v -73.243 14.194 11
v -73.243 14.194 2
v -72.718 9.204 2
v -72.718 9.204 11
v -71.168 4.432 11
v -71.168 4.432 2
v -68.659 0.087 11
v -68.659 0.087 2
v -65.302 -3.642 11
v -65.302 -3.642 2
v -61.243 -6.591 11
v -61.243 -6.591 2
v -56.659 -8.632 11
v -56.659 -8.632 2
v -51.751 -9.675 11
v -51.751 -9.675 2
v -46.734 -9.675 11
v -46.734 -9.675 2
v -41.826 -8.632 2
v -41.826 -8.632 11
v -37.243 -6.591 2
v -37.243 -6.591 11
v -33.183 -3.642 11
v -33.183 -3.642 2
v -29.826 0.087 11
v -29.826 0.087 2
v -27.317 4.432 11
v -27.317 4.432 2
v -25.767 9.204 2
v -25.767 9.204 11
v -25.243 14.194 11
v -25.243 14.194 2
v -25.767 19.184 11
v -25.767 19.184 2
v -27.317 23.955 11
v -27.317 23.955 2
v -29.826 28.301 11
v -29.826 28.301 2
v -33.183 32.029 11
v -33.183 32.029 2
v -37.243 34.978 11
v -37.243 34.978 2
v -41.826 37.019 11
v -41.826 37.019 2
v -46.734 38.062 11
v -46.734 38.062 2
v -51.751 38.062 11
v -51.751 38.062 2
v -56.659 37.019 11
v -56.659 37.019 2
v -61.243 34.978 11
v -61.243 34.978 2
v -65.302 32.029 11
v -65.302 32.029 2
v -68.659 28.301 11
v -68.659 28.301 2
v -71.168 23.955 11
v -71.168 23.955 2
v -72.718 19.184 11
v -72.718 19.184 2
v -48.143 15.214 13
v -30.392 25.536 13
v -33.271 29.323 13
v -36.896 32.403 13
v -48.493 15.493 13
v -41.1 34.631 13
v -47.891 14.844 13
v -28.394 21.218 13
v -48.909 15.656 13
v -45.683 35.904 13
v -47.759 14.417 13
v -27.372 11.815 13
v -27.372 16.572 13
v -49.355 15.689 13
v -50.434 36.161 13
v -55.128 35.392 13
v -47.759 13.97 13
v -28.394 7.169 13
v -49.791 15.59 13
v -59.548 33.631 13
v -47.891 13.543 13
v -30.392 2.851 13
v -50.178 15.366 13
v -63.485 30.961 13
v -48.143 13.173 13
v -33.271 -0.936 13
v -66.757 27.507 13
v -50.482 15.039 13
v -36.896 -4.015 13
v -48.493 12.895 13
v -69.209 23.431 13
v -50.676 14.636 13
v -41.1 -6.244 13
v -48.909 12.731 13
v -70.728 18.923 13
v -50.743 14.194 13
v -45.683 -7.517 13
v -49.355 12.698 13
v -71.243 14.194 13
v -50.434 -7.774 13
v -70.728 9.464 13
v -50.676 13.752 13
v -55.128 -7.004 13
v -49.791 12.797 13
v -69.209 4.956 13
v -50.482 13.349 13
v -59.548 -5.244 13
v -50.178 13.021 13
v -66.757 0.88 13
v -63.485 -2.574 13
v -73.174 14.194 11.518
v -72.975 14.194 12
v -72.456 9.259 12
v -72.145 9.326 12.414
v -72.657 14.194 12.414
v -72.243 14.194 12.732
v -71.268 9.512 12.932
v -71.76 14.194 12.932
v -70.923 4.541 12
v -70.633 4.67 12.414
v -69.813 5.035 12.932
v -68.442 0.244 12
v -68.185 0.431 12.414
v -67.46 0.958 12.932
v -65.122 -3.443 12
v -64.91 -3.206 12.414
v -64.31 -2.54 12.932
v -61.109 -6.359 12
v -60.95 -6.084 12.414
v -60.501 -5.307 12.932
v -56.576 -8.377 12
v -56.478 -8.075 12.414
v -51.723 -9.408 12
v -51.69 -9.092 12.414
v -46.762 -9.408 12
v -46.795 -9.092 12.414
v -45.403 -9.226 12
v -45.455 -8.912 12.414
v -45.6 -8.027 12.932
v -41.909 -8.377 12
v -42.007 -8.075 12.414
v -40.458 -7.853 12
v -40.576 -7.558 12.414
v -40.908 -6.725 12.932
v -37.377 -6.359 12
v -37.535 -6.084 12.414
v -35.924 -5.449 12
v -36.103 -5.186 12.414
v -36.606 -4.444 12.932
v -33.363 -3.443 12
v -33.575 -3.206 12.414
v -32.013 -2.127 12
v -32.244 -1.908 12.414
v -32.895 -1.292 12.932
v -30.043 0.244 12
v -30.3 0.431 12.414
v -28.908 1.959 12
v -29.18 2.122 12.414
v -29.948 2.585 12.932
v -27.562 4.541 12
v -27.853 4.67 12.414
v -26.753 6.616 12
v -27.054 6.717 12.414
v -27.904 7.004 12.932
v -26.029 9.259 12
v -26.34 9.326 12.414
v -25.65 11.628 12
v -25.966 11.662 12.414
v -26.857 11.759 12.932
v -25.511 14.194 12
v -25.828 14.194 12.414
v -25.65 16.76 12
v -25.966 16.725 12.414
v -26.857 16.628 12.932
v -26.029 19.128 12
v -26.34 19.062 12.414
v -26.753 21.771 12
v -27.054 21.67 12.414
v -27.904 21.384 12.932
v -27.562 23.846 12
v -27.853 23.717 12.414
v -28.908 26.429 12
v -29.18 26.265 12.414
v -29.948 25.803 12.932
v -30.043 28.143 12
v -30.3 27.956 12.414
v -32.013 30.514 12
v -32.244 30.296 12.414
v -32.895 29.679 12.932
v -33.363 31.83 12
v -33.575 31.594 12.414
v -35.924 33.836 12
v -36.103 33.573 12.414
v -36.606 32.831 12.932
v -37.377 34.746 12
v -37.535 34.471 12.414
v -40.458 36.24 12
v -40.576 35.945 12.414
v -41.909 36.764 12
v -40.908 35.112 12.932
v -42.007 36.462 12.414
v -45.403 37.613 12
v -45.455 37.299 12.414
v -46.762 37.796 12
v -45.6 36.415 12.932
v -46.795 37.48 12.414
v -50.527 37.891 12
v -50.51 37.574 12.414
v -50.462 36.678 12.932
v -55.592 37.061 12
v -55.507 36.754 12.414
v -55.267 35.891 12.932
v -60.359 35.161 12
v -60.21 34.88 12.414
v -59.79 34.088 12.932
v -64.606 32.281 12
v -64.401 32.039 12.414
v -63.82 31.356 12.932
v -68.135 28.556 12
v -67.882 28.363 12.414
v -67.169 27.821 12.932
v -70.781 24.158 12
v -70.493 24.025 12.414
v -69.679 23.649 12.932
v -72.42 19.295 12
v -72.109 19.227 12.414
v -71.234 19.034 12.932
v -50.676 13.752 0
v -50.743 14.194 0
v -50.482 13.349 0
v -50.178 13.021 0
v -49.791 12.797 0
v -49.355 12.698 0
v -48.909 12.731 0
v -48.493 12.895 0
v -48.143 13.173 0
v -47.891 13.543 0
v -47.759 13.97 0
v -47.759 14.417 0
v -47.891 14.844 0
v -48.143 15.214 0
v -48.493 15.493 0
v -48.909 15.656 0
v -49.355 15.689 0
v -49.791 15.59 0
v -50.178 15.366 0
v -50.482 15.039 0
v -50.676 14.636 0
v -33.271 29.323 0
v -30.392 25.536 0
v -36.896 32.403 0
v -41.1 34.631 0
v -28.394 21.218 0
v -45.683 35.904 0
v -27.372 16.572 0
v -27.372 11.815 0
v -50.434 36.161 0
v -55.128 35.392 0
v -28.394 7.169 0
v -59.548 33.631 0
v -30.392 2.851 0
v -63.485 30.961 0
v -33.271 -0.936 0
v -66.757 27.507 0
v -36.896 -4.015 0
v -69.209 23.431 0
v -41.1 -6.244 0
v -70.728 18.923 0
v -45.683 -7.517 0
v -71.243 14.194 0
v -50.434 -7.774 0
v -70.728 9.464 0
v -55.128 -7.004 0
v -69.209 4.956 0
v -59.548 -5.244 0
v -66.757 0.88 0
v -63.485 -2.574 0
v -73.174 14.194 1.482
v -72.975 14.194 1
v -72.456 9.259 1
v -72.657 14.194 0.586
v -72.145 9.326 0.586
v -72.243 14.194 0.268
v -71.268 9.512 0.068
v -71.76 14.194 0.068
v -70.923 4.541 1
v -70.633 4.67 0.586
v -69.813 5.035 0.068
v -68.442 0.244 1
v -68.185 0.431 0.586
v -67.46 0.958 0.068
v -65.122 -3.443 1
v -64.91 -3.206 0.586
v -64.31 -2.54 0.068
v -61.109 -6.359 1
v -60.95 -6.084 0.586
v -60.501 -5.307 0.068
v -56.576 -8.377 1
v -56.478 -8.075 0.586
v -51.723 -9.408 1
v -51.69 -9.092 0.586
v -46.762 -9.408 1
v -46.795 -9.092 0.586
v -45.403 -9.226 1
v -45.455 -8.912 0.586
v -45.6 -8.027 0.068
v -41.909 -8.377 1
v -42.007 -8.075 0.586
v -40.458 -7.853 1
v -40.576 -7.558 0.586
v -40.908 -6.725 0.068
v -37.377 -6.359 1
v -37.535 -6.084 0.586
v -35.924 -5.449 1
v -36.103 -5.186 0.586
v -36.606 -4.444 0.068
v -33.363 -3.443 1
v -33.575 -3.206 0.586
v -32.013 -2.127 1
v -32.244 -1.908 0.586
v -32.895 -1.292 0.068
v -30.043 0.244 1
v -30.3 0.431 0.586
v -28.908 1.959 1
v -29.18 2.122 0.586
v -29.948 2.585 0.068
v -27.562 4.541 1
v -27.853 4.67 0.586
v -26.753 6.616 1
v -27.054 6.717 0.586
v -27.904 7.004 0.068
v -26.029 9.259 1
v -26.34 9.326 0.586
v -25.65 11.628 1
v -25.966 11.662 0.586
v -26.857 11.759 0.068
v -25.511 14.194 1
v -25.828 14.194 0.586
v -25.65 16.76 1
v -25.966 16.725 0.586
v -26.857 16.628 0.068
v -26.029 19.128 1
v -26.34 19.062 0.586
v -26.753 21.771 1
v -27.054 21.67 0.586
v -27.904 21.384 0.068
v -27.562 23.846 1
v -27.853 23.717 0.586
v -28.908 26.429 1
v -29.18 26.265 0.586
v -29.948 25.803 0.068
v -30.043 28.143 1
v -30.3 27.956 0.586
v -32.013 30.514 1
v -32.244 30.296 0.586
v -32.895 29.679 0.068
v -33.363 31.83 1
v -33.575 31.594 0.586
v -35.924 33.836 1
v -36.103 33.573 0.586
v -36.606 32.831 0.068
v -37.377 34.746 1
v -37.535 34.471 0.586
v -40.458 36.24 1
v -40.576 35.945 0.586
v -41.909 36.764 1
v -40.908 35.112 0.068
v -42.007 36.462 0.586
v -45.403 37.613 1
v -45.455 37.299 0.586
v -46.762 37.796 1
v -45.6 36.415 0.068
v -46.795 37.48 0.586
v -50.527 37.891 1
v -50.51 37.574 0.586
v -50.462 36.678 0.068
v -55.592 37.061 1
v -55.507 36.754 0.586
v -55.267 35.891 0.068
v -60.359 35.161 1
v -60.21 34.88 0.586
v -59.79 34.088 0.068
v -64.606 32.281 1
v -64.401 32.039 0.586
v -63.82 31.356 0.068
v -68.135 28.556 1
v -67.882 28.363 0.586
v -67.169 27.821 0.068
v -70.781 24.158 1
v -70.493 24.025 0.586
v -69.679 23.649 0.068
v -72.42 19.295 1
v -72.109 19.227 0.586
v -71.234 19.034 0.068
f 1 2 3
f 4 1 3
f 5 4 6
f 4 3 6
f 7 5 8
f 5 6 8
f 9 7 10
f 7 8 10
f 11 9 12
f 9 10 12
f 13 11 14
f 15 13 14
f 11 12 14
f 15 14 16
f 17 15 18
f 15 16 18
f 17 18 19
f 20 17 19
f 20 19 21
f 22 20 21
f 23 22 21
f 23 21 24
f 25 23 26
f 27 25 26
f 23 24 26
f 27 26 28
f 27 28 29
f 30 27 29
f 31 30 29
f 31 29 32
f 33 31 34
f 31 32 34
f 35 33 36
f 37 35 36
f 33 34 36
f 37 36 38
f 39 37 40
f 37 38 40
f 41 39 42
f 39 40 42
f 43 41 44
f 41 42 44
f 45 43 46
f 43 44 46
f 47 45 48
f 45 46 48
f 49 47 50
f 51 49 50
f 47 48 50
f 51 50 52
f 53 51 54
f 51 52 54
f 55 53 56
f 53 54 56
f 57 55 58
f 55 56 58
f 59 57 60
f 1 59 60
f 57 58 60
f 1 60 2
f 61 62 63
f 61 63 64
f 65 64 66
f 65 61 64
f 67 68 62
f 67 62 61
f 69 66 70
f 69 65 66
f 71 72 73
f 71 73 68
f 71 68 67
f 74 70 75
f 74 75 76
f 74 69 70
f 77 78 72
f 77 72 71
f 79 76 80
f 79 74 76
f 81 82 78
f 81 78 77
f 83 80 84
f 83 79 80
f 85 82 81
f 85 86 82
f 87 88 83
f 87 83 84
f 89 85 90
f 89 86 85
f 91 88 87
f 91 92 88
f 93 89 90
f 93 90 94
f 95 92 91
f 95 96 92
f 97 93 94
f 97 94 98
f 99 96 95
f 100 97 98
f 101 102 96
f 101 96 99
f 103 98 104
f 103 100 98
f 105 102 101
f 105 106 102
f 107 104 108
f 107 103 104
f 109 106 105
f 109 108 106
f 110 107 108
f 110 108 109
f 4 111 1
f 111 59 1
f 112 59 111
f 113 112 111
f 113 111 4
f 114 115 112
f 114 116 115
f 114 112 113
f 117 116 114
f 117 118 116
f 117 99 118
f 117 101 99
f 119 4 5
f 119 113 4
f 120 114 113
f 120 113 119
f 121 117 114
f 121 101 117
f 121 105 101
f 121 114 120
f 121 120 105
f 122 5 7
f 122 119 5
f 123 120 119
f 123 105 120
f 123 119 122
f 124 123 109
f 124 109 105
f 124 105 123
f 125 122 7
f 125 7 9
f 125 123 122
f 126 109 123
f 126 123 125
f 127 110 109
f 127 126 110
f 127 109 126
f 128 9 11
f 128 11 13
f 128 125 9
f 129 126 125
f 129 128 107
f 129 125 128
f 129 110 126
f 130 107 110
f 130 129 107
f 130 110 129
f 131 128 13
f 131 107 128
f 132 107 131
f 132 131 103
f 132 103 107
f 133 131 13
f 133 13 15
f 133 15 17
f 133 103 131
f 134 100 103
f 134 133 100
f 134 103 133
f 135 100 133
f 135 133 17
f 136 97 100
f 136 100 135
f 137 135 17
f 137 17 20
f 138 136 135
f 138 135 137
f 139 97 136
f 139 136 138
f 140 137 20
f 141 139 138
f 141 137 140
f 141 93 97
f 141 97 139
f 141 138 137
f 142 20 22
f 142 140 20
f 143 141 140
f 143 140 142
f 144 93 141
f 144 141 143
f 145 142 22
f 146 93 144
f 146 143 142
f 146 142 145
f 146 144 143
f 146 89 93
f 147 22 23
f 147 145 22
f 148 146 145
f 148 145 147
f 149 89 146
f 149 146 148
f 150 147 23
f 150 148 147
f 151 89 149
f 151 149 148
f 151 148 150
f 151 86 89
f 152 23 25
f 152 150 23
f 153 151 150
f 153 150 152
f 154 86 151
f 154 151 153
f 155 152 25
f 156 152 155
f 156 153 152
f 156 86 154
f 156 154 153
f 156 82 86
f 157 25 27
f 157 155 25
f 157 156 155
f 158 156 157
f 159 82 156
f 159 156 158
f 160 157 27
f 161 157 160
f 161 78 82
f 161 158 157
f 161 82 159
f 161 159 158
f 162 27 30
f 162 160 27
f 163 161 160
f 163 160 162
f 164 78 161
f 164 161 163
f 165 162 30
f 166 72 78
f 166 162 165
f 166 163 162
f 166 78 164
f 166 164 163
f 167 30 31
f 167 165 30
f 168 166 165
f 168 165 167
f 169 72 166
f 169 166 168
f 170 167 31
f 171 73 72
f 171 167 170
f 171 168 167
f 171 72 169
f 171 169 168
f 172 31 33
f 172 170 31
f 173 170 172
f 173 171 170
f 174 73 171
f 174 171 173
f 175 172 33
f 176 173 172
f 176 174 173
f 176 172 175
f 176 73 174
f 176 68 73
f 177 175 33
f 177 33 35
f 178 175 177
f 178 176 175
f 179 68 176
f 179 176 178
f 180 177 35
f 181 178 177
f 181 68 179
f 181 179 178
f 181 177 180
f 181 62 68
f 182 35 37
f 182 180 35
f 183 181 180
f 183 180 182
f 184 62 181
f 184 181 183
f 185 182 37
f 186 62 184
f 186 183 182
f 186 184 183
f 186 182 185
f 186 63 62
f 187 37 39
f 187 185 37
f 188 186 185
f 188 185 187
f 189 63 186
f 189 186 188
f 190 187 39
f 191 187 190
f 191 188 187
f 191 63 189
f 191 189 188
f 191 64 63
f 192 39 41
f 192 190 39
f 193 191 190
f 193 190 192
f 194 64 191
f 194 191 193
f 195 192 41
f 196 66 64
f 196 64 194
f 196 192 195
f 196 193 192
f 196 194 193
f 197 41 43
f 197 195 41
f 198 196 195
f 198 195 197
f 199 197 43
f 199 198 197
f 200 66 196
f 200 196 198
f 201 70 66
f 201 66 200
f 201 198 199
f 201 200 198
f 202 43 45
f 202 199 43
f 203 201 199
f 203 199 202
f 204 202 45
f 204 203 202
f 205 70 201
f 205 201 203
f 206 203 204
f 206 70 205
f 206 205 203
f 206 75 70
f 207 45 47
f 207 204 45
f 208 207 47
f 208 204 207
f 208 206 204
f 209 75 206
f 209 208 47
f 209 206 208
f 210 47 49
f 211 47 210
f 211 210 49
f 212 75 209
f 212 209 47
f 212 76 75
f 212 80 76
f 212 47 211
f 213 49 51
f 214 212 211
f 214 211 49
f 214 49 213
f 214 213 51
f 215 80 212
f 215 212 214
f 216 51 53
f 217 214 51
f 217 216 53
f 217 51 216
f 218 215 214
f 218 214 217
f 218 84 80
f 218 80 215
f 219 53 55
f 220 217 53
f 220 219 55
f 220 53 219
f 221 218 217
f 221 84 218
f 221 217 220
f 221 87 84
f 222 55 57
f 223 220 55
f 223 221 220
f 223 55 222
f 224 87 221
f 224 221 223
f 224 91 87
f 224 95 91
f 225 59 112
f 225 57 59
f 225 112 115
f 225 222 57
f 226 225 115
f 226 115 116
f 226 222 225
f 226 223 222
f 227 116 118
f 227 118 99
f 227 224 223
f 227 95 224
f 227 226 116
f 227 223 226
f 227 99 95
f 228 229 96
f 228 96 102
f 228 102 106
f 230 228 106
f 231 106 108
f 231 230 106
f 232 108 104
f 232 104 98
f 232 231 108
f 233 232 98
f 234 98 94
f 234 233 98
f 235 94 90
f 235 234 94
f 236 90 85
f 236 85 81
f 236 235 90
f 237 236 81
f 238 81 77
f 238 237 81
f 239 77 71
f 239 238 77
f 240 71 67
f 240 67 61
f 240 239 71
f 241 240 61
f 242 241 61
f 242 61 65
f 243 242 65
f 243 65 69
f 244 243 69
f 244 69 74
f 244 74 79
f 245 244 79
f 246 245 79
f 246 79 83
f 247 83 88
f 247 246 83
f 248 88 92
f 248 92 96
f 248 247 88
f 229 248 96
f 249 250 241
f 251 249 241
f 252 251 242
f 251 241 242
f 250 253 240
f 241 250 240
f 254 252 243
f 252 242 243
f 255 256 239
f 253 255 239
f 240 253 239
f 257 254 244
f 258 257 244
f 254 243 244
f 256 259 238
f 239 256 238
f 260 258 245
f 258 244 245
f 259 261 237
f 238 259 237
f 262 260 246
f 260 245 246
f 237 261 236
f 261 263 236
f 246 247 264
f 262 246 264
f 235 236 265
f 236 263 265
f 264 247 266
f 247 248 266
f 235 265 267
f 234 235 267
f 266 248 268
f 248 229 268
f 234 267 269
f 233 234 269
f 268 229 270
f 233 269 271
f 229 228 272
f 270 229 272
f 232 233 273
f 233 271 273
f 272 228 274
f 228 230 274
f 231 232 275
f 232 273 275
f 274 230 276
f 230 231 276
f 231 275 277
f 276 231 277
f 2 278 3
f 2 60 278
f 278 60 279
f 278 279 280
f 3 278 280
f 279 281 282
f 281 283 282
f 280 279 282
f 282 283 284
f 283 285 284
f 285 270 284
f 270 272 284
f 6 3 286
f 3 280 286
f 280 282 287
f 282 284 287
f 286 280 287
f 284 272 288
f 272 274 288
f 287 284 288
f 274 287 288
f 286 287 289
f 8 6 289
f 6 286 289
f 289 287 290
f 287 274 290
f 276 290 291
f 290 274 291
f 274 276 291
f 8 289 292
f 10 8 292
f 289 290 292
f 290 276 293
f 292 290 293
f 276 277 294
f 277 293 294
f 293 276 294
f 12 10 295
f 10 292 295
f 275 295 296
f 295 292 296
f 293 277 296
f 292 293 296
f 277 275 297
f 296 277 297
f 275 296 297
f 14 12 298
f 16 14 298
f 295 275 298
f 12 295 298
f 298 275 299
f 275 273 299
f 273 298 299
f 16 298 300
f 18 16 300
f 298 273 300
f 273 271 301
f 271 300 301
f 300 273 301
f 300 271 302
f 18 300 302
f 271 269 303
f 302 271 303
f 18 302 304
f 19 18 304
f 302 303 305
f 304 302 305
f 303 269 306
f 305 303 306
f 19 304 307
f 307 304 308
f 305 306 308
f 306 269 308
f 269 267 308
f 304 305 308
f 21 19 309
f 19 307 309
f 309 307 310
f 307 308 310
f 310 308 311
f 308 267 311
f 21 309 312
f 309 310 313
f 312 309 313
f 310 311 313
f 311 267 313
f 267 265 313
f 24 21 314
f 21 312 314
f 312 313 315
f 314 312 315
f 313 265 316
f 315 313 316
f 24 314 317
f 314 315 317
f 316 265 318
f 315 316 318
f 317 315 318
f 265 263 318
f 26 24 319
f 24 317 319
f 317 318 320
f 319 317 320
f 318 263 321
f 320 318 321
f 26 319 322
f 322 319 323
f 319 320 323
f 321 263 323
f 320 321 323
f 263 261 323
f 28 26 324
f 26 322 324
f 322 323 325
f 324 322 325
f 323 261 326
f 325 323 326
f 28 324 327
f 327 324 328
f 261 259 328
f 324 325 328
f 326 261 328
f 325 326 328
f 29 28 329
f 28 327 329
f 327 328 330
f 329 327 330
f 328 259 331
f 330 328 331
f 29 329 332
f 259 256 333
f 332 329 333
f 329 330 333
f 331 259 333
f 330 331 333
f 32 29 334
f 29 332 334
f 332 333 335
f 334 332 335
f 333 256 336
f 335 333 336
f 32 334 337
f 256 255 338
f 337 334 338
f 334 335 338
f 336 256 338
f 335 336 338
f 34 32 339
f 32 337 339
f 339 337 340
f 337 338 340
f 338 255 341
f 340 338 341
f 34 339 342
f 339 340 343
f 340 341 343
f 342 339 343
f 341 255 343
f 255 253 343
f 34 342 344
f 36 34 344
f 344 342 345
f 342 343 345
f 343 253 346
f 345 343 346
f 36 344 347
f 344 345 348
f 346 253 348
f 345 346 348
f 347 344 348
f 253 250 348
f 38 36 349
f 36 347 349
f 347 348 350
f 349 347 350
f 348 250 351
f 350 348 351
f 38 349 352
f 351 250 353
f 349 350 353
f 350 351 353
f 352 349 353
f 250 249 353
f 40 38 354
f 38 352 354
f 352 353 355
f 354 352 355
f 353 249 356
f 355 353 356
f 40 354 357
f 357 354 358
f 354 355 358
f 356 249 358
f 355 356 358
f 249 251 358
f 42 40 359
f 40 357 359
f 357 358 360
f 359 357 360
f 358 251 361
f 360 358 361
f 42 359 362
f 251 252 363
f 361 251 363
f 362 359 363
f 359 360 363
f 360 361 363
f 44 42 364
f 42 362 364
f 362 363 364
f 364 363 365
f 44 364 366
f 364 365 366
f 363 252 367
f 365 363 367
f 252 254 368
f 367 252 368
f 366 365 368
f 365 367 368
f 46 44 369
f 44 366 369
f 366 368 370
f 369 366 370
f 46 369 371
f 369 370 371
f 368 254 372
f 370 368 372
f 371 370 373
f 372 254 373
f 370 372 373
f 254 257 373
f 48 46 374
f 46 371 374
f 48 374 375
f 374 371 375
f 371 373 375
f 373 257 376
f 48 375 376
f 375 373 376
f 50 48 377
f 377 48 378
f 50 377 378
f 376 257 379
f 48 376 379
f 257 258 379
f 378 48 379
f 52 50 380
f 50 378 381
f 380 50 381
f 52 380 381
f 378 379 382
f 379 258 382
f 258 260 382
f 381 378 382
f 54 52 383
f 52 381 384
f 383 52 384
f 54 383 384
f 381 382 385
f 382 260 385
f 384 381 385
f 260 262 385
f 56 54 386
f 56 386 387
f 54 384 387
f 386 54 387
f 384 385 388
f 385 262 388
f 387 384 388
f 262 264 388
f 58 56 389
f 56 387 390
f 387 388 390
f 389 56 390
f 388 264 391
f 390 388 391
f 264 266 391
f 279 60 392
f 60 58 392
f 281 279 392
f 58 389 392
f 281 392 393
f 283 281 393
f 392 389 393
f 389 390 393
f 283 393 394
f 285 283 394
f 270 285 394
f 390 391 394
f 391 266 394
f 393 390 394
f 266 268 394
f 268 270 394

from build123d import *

# Parameters (mm, degrees)
CROQUIS1_R              = 24
CROQUIS1_R_2            = 1.5
SALIENTE_EXTRUIR1_DEPTH = 13
REDONDEO1_R             = 2
REDONDEO2_R             = 2


with BuildPart() as part:
    # Croquis1 → Saliente-Extruir1 (new body)
    with BuildSketch(Plane.XY):
        with Locations(Location((-49.242561536, 14.193667069, 0), (0, 0, 180))):
            Circle(CROQUIS1_R)
        with Locations(Location((-49.242561536, 14.193667069, 0), (0, 0, 180))):
            Circle(CROQUIS1_R_2, mode=Mode.SUBTRACT)
    extrude(amount=SALIENTE_EXTRUIR1_DEPTH)

    # Redondeo1
    redondeo1_edges = [part.edges().sort_by_distance(p)[0] for p in [
        (-25.242561536, 14.193667069, 13),
    ]]
    fillet(redondeo1_edges, radius=REDONDEO1_R)

    # Redondeo2
    redondeo2_edges = [part.edges().sort_by_distance(p)[0] for p in [
        (-25.242561536, 14.193667069, 0),
    ]]
    fillet(redondeo2_edges, radius=REDONDEO2_R)


solid = part.part
